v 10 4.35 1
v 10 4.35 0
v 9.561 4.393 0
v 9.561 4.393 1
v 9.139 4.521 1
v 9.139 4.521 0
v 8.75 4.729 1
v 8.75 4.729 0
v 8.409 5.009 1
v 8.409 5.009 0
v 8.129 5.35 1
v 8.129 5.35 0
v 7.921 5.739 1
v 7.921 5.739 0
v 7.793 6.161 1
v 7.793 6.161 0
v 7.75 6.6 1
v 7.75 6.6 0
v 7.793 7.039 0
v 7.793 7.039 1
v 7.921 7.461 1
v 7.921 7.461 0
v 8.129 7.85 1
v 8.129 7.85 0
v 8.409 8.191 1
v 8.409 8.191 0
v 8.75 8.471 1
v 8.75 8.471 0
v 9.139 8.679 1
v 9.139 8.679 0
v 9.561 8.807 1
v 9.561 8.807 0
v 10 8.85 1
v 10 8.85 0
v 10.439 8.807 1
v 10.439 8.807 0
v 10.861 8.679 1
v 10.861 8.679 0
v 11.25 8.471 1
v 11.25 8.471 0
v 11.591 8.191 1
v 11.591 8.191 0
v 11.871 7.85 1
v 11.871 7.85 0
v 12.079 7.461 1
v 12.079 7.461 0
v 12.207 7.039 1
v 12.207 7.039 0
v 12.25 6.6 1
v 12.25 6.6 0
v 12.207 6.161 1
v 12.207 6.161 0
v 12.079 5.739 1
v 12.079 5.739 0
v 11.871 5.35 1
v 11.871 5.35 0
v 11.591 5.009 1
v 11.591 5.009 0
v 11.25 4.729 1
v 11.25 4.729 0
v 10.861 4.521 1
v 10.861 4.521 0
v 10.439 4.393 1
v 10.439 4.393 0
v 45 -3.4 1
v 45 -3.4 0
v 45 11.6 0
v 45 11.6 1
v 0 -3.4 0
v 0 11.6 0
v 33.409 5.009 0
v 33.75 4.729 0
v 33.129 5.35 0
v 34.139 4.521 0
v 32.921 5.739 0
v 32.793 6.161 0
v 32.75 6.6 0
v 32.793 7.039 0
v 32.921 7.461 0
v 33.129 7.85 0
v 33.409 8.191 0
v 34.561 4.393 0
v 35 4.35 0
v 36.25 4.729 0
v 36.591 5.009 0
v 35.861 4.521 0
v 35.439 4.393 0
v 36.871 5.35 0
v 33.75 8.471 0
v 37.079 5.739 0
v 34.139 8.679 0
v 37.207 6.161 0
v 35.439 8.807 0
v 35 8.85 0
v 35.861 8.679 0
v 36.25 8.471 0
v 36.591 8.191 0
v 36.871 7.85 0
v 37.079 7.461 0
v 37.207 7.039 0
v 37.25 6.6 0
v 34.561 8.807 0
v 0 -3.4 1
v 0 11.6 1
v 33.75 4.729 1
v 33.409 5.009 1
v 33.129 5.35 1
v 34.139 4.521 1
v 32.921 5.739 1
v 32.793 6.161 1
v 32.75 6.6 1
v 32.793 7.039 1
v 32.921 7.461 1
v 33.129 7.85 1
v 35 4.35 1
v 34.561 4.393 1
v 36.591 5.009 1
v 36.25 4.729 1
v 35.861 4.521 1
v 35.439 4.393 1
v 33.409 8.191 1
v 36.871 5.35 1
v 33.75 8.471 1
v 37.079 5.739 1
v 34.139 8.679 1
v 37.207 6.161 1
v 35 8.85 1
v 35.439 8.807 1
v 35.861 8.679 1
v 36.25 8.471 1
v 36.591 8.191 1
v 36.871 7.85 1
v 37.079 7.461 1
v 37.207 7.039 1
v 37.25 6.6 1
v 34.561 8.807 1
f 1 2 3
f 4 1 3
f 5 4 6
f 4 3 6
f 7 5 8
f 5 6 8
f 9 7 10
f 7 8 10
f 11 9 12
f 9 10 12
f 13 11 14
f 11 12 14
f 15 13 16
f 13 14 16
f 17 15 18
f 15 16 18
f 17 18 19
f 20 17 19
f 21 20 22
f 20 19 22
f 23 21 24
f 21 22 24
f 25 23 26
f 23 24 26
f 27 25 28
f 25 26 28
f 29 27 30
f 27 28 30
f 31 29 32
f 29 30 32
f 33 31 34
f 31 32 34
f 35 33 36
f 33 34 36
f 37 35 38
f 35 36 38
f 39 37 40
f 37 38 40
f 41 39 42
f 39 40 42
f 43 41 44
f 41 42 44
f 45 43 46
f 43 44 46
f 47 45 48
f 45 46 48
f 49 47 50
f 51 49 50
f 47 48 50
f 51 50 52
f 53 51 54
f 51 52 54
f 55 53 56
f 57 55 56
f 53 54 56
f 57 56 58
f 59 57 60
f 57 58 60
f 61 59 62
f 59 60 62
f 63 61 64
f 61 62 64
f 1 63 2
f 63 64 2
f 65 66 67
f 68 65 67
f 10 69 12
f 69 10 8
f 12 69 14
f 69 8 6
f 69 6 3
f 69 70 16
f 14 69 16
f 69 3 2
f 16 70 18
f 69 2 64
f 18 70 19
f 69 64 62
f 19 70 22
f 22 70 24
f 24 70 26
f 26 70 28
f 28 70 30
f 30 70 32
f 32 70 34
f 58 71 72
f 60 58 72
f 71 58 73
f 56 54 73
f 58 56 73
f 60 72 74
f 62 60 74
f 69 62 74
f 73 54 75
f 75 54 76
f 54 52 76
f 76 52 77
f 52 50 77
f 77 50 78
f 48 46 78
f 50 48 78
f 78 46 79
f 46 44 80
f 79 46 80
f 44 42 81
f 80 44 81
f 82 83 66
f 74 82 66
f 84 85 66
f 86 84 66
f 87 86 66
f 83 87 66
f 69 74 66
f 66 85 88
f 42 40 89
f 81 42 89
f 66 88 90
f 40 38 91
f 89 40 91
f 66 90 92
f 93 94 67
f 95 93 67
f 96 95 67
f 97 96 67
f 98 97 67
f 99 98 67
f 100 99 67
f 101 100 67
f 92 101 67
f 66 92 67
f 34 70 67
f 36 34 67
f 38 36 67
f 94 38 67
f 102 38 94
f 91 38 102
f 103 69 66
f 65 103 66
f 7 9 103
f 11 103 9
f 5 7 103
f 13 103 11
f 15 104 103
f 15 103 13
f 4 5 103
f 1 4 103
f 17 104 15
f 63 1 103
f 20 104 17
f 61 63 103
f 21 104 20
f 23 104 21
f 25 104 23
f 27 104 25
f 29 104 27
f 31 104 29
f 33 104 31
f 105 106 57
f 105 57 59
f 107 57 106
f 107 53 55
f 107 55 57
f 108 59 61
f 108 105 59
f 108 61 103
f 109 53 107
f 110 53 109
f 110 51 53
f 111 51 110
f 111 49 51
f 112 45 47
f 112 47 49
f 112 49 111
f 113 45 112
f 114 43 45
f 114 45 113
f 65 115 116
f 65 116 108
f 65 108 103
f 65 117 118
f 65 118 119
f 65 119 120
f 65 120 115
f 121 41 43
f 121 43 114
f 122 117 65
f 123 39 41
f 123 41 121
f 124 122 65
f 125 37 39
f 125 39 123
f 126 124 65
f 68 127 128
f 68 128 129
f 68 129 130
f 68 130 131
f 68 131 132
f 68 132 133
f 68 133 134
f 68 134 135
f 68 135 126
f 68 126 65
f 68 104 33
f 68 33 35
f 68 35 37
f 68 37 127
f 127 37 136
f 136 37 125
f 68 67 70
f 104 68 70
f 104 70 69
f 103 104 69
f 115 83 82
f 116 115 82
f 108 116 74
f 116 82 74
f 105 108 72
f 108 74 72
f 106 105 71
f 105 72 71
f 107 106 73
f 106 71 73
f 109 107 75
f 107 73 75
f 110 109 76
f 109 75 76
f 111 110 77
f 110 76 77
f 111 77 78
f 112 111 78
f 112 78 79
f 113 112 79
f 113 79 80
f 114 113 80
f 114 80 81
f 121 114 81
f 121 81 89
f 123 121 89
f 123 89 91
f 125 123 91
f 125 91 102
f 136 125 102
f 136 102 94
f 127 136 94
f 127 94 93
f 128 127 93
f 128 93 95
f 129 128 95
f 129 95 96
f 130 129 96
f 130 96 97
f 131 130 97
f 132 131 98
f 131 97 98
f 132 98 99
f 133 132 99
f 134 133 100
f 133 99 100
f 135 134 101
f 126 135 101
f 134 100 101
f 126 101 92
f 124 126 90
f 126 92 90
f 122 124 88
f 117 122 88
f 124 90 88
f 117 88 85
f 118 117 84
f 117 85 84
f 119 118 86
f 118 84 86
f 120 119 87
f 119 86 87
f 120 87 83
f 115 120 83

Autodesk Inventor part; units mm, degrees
ref_plane "YZ Plane" through (0, 0, 0) normal (1, 0, 0) x (0, 1, 0)
ref_plane "XZ Plane" through (0, 0, 0) normal (0, 1, 0) x (-1, 0, 0)
ref_plane "XY Plane" through (0, 0, 0) normal (0, 0, 1) x (1, 0, 0)
sketch "Sketch1" plane through (0, 0, 0) normal (0, 0, 1) x (1, 0, 0)
  line L0 (0, -3.4) -> (45, -3.4)
  line L1 (45, -3.4) -> (45, 11.6)
  line L2 (45, 11.6) -> (0, 11.6)
  line L3 (0, 11.6) -> (0, -3.4)
  point P0 (0, 0)
  dimension "d1" = 3.4
  dimension "d2" = 45
  dimension "d3" = 45
  dimension "d4" = 15
extrude "Plate1" add sketch "Sketch1" along normal blind 1
sketch "Sketch2" plane through (0, 0, 1) normal (0, 0, 1) x (1, 0, 0)
  line L0 (45, -3.4) -> (0, -3.4) projected
  line L1 (45, 11.6) -> (45, -3.4) projected
  line L2 (0, -3.4) -> (0, 11.6) projected
  point P0 (0, 0)
  point P1 (35, 6.6)
  point P2 (10, 6.6)
  dimension "d5" = 10
  dimension "d6" = 10
  dimension "d7" = 10
hole "Hole1" at (35, 6.6, 1) at (10, 6.6, 1) direction (0, 0, -1) diameter 4.5 end through all
equation "\"d13\" = Thickness"
equation "\"d0\" = Thickness"
equation "\"BendRadius\" = Thickness"
equation "\"BendReliefWidth\" = Thickness"
equation "\"BendReliefDepth\" = 0.5 * Thickness"
equation "\"CornerReliefSize\" = 4 * Thickness"
equation "\"MinimumRemnant\" = 2 * Thickness"
equation "\"TransitionRadius\" = BendRadius"
equation "\"JacobiRadiusSize\" = BendRadius"
equation "\"GapSize\" = Thickness"
equation "\"Thickness\" = 1"
properties part number "Pletina Terminal V2" material "Steel, Carbon"
